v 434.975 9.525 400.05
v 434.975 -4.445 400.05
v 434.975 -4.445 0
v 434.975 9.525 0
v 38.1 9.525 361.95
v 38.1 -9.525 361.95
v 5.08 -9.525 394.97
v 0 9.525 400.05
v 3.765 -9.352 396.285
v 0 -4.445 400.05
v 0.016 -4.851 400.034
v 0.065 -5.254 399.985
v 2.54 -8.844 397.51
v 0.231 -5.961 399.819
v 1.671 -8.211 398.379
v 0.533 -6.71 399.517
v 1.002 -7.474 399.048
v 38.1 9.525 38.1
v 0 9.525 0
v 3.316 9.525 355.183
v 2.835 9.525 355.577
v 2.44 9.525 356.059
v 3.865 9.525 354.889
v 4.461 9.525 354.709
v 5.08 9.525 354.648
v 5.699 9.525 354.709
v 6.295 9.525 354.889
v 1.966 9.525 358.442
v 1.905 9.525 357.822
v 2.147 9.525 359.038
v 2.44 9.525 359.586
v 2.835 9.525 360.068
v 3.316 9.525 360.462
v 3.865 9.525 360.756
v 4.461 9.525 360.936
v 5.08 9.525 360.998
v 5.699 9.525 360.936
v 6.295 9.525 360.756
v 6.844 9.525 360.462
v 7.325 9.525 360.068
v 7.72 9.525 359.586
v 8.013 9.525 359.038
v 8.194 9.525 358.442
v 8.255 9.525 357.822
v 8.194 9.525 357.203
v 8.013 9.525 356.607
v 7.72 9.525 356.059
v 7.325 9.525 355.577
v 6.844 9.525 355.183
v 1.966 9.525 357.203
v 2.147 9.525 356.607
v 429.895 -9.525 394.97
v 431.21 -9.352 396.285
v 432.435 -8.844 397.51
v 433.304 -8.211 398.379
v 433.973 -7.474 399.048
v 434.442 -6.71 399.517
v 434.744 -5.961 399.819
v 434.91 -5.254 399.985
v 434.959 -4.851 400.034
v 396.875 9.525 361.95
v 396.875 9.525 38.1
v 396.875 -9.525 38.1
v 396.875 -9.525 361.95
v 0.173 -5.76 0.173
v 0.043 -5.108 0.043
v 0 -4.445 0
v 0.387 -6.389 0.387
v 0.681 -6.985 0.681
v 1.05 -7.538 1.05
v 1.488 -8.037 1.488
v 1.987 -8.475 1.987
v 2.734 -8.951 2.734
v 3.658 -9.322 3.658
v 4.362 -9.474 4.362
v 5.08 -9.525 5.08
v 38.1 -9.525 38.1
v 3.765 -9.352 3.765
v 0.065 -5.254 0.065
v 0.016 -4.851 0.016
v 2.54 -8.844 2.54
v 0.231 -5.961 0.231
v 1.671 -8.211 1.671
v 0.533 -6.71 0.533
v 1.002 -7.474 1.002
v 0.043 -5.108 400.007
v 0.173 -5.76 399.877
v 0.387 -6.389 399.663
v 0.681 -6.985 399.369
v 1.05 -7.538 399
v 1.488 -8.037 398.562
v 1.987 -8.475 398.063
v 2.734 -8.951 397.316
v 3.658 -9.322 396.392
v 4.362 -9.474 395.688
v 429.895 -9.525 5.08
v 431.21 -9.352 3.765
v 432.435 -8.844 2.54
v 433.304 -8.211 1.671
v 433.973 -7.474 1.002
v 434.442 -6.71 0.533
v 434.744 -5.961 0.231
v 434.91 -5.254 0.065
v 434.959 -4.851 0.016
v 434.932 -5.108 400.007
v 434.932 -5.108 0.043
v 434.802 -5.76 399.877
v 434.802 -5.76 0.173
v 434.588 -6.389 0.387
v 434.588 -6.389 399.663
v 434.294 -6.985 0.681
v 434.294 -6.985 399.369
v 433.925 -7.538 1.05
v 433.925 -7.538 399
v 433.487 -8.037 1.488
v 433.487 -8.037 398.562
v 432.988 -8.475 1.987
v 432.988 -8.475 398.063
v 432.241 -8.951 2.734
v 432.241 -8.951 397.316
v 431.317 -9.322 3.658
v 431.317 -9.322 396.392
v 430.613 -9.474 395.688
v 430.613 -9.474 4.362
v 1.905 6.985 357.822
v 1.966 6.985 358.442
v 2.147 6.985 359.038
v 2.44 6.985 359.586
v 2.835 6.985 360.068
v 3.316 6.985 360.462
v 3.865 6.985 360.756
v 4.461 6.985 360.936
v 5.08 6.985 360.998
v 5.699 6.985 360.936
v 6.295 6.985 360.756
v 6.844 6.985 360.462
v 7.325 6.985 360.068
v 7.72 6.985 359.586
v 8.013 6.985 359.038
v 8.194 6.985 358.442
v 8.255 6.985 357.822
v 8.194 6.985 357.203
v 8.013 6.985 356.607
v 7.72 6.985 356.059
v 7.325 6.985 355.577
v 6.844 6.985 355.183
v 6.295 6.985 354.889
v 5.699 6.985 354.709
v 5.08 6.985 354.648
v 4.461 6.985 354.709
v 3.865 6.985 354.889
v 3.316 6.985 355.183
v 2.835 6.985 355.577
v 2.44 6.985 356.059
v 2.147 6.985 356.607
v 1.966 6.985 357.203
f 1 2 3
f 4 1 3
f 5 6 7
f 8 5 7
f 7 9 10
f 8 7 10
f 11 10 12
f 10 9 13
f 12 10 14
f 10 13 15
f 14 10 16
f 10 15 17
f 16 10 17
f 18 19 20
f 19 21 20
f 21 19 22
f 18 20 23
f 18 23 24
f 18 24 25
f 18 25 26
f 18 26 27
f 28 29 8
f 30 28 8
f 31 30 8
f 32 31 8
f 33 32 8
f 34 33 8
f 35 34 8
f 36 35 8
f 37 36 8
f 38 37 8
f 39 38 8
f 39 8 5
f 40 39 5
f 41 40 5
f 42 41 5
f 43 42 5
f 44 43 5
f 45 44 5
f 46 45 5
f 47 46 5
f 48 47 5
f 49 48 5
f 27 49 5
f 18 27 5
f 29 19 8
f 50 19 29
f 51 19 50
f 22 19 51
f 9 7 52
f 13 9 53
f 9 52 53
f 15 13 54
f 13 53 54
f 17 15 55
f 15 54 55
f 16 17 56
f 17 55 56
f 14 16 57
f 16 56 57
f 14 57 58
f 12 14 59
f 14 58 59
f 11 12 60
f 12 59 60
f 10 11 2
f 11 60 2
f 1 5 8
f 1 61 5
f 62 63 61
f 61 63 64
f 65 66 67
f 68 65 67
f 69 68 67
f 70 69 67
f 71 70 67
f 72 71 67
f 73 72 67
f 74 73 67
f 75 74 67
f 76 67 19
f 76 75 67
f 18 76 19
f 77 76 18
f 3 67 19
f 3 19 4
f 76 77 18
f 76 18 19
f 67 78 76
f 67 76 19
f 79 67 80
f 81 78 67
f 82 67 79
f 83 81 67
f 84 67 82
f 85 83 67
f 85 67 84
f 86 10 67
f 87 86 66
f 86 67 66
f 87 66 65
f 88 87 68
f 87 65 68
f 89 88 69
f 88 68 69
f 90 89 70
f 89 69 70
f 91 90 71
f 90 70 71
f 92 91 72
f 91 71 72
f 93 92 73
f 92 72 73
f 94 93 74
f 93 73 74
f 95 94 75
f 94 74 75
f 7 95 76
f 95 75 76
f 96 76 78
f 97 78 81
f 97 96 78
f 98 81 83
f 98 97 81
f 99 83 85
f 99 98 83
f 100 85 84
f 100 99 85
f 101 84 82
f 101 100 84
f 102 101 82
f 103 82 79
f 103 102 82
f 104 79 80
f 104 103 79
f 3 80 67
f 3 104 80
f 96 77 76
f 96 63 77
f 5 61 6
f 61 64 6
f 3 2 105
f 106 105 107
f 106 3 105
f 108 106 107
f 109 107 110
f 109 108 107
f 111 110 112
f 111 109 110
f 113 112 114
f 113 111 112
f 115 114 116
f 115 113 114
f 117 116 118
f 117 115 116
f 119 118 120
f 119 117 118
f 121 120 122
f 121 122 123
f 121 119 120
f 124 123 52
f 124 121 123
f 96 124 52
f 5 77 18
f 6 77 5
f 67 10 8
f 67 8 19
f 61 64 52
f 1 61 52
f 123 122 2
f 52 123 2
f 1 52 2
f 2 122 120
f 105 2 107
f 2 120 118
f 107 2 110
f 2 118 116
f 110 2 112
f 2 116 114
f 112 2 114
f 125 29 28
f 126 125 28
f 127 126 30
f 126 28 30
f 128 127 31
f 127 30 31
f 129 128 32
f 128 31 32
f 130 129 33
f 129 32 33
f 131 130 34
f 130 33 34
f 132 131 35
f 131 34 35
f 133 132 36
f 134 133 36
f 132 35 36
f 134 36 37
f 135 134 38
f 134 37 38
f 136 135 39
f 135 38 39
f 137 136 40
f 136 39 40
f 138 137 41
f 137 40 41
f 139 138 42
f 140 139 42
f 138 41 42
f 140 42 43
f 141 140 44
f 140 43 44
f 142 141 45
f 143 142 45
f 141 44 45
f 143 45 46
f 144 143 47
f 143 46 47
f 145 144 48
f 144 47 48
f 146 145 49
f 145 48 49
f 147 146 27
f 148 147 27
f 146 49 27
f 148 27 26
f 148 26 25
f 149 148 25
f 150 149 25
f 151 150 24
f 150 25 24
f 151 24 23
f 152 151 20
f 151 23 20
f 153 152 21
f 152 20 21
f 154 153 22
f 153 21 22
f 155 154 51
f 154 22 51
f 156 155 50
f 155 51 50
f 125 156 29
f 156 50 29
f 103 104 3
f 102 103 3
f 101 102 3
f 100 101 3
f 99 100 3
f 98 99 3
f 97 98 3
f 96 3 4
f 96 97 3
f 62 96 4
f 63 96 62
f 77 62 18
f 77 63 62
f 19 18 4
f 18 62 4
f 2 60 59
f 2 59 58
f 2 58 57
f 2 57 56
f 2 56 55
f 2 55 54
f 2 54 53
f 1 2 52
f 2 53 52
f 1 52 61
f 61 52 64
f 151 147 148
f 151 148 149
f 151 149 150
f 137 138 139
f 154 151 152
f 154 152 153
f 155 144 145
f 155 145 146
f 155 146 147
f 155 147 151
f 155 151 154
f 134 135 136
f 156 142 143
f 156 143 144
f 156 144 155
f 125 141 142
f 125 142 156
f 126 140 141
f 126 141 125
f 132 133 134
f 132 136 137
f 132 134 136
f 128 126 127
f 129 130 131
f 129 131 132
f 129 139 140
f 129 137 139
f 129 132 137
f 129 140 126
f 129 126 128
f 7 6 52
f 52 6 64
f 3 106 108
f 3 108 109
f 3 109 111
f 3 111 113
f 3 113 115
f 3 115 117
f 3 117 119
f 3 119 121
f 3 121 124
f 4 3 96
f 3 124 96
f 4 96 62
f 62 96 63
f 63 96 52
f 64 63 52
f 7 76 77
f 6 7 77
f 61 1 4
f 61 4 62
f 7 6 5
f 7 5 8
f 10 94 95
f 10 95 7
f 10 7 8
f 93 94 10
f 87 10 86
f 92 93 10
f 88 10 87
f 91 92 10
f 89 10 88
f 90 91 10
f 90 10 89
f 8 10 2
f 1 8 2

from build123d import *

# Parameters (mm, degrees)
F2_DEPTH  = 9.525
F4_DEPTH  = 9.525
F11_R     = 3.175
F12_DEPTH = 2.54
F13_R     = 5.08
F13_2_R   = 5.08
F13_3_R   = 5.08
F13_4_R   = 5.08


with BuildPart() as f2:
    # F1 (on Front) → F2 (new body, symmetric)
    with BuildSketch(Plane.XZ):
        Polygon((0, 400.05), (0, 0), (38.1, 38.1), (38.1, 361.95), align=None)
    extrude(amount=F2_DEPTH, both=True)


with BuildPart() as f4:
    # F3 (on Front) → F4 (new body, symmetric)
    with BuildSketch(Plane.XZ):
        Polygon((38.1, 38.1), (0, 0), (434.975, 0), (396.875, 38.1), align=None)
    extrude(amount=F4_DEPTH, both=True)


with BuildPart() as f7_1:
    # F7: instance of F2
    add(f2.part.mirror(Plane.YZ.offset(217.4875)))

    # F13#3
    f13_3_edges = [f7_1.edges().sort_by_distance(p)[0] for p in [
        (434.975, -9.525, 200.025),
    ]]
    fillet(f13_3_edges, radius=F13_3_R)


with BuildPart() as f10_1:
    # F10: instance of F4
    add(f4.part.mirror(Plane.XY.offset(200.025)))

    # F13#4
    f13_4_edges = [f10_1.edges().sort_by_distance(p)[0] for p in [
        (217.4875, -9.525, 400.05),
    ]]
    fillet(f13_4_edges, radius=F13_4_R)


with BuildPart() as f2_1:
    add(f2.part)

    # F11 (on face) → F12 (cut)
    with BuildSketch(Plane(origin=(0, 9.525, 0), x_dir=(-1, 0, 0), z_dir=(0, 1, 0))):
        with Locations((-5.08, 357.8225)):
            Circle(F11_R)
    extrude(amount=-F12_DEPTH, mode=Mode.SUBTRACT)

    # F13
    f13_edges = [f2_1.edges().sort_by_distance(p)[0] for p in [
        (0, -9.525, 200.025),
    ]]
    fillet(f13_edges, radius=F13_R)


with BuildPart() as f4_1:
    add(f4.part)

    # F13#2
    f13_2_edges = [f4_1.edges().sort_by_distance(p)[0] for p in [
        (217.4875, -9.525, 0),
    ]]
    fillet(f13_2_edges, radius=F13_2_R)


solid = Compound([f7_1.part, f10_1.part, f2_1.part, f4_1.part])
